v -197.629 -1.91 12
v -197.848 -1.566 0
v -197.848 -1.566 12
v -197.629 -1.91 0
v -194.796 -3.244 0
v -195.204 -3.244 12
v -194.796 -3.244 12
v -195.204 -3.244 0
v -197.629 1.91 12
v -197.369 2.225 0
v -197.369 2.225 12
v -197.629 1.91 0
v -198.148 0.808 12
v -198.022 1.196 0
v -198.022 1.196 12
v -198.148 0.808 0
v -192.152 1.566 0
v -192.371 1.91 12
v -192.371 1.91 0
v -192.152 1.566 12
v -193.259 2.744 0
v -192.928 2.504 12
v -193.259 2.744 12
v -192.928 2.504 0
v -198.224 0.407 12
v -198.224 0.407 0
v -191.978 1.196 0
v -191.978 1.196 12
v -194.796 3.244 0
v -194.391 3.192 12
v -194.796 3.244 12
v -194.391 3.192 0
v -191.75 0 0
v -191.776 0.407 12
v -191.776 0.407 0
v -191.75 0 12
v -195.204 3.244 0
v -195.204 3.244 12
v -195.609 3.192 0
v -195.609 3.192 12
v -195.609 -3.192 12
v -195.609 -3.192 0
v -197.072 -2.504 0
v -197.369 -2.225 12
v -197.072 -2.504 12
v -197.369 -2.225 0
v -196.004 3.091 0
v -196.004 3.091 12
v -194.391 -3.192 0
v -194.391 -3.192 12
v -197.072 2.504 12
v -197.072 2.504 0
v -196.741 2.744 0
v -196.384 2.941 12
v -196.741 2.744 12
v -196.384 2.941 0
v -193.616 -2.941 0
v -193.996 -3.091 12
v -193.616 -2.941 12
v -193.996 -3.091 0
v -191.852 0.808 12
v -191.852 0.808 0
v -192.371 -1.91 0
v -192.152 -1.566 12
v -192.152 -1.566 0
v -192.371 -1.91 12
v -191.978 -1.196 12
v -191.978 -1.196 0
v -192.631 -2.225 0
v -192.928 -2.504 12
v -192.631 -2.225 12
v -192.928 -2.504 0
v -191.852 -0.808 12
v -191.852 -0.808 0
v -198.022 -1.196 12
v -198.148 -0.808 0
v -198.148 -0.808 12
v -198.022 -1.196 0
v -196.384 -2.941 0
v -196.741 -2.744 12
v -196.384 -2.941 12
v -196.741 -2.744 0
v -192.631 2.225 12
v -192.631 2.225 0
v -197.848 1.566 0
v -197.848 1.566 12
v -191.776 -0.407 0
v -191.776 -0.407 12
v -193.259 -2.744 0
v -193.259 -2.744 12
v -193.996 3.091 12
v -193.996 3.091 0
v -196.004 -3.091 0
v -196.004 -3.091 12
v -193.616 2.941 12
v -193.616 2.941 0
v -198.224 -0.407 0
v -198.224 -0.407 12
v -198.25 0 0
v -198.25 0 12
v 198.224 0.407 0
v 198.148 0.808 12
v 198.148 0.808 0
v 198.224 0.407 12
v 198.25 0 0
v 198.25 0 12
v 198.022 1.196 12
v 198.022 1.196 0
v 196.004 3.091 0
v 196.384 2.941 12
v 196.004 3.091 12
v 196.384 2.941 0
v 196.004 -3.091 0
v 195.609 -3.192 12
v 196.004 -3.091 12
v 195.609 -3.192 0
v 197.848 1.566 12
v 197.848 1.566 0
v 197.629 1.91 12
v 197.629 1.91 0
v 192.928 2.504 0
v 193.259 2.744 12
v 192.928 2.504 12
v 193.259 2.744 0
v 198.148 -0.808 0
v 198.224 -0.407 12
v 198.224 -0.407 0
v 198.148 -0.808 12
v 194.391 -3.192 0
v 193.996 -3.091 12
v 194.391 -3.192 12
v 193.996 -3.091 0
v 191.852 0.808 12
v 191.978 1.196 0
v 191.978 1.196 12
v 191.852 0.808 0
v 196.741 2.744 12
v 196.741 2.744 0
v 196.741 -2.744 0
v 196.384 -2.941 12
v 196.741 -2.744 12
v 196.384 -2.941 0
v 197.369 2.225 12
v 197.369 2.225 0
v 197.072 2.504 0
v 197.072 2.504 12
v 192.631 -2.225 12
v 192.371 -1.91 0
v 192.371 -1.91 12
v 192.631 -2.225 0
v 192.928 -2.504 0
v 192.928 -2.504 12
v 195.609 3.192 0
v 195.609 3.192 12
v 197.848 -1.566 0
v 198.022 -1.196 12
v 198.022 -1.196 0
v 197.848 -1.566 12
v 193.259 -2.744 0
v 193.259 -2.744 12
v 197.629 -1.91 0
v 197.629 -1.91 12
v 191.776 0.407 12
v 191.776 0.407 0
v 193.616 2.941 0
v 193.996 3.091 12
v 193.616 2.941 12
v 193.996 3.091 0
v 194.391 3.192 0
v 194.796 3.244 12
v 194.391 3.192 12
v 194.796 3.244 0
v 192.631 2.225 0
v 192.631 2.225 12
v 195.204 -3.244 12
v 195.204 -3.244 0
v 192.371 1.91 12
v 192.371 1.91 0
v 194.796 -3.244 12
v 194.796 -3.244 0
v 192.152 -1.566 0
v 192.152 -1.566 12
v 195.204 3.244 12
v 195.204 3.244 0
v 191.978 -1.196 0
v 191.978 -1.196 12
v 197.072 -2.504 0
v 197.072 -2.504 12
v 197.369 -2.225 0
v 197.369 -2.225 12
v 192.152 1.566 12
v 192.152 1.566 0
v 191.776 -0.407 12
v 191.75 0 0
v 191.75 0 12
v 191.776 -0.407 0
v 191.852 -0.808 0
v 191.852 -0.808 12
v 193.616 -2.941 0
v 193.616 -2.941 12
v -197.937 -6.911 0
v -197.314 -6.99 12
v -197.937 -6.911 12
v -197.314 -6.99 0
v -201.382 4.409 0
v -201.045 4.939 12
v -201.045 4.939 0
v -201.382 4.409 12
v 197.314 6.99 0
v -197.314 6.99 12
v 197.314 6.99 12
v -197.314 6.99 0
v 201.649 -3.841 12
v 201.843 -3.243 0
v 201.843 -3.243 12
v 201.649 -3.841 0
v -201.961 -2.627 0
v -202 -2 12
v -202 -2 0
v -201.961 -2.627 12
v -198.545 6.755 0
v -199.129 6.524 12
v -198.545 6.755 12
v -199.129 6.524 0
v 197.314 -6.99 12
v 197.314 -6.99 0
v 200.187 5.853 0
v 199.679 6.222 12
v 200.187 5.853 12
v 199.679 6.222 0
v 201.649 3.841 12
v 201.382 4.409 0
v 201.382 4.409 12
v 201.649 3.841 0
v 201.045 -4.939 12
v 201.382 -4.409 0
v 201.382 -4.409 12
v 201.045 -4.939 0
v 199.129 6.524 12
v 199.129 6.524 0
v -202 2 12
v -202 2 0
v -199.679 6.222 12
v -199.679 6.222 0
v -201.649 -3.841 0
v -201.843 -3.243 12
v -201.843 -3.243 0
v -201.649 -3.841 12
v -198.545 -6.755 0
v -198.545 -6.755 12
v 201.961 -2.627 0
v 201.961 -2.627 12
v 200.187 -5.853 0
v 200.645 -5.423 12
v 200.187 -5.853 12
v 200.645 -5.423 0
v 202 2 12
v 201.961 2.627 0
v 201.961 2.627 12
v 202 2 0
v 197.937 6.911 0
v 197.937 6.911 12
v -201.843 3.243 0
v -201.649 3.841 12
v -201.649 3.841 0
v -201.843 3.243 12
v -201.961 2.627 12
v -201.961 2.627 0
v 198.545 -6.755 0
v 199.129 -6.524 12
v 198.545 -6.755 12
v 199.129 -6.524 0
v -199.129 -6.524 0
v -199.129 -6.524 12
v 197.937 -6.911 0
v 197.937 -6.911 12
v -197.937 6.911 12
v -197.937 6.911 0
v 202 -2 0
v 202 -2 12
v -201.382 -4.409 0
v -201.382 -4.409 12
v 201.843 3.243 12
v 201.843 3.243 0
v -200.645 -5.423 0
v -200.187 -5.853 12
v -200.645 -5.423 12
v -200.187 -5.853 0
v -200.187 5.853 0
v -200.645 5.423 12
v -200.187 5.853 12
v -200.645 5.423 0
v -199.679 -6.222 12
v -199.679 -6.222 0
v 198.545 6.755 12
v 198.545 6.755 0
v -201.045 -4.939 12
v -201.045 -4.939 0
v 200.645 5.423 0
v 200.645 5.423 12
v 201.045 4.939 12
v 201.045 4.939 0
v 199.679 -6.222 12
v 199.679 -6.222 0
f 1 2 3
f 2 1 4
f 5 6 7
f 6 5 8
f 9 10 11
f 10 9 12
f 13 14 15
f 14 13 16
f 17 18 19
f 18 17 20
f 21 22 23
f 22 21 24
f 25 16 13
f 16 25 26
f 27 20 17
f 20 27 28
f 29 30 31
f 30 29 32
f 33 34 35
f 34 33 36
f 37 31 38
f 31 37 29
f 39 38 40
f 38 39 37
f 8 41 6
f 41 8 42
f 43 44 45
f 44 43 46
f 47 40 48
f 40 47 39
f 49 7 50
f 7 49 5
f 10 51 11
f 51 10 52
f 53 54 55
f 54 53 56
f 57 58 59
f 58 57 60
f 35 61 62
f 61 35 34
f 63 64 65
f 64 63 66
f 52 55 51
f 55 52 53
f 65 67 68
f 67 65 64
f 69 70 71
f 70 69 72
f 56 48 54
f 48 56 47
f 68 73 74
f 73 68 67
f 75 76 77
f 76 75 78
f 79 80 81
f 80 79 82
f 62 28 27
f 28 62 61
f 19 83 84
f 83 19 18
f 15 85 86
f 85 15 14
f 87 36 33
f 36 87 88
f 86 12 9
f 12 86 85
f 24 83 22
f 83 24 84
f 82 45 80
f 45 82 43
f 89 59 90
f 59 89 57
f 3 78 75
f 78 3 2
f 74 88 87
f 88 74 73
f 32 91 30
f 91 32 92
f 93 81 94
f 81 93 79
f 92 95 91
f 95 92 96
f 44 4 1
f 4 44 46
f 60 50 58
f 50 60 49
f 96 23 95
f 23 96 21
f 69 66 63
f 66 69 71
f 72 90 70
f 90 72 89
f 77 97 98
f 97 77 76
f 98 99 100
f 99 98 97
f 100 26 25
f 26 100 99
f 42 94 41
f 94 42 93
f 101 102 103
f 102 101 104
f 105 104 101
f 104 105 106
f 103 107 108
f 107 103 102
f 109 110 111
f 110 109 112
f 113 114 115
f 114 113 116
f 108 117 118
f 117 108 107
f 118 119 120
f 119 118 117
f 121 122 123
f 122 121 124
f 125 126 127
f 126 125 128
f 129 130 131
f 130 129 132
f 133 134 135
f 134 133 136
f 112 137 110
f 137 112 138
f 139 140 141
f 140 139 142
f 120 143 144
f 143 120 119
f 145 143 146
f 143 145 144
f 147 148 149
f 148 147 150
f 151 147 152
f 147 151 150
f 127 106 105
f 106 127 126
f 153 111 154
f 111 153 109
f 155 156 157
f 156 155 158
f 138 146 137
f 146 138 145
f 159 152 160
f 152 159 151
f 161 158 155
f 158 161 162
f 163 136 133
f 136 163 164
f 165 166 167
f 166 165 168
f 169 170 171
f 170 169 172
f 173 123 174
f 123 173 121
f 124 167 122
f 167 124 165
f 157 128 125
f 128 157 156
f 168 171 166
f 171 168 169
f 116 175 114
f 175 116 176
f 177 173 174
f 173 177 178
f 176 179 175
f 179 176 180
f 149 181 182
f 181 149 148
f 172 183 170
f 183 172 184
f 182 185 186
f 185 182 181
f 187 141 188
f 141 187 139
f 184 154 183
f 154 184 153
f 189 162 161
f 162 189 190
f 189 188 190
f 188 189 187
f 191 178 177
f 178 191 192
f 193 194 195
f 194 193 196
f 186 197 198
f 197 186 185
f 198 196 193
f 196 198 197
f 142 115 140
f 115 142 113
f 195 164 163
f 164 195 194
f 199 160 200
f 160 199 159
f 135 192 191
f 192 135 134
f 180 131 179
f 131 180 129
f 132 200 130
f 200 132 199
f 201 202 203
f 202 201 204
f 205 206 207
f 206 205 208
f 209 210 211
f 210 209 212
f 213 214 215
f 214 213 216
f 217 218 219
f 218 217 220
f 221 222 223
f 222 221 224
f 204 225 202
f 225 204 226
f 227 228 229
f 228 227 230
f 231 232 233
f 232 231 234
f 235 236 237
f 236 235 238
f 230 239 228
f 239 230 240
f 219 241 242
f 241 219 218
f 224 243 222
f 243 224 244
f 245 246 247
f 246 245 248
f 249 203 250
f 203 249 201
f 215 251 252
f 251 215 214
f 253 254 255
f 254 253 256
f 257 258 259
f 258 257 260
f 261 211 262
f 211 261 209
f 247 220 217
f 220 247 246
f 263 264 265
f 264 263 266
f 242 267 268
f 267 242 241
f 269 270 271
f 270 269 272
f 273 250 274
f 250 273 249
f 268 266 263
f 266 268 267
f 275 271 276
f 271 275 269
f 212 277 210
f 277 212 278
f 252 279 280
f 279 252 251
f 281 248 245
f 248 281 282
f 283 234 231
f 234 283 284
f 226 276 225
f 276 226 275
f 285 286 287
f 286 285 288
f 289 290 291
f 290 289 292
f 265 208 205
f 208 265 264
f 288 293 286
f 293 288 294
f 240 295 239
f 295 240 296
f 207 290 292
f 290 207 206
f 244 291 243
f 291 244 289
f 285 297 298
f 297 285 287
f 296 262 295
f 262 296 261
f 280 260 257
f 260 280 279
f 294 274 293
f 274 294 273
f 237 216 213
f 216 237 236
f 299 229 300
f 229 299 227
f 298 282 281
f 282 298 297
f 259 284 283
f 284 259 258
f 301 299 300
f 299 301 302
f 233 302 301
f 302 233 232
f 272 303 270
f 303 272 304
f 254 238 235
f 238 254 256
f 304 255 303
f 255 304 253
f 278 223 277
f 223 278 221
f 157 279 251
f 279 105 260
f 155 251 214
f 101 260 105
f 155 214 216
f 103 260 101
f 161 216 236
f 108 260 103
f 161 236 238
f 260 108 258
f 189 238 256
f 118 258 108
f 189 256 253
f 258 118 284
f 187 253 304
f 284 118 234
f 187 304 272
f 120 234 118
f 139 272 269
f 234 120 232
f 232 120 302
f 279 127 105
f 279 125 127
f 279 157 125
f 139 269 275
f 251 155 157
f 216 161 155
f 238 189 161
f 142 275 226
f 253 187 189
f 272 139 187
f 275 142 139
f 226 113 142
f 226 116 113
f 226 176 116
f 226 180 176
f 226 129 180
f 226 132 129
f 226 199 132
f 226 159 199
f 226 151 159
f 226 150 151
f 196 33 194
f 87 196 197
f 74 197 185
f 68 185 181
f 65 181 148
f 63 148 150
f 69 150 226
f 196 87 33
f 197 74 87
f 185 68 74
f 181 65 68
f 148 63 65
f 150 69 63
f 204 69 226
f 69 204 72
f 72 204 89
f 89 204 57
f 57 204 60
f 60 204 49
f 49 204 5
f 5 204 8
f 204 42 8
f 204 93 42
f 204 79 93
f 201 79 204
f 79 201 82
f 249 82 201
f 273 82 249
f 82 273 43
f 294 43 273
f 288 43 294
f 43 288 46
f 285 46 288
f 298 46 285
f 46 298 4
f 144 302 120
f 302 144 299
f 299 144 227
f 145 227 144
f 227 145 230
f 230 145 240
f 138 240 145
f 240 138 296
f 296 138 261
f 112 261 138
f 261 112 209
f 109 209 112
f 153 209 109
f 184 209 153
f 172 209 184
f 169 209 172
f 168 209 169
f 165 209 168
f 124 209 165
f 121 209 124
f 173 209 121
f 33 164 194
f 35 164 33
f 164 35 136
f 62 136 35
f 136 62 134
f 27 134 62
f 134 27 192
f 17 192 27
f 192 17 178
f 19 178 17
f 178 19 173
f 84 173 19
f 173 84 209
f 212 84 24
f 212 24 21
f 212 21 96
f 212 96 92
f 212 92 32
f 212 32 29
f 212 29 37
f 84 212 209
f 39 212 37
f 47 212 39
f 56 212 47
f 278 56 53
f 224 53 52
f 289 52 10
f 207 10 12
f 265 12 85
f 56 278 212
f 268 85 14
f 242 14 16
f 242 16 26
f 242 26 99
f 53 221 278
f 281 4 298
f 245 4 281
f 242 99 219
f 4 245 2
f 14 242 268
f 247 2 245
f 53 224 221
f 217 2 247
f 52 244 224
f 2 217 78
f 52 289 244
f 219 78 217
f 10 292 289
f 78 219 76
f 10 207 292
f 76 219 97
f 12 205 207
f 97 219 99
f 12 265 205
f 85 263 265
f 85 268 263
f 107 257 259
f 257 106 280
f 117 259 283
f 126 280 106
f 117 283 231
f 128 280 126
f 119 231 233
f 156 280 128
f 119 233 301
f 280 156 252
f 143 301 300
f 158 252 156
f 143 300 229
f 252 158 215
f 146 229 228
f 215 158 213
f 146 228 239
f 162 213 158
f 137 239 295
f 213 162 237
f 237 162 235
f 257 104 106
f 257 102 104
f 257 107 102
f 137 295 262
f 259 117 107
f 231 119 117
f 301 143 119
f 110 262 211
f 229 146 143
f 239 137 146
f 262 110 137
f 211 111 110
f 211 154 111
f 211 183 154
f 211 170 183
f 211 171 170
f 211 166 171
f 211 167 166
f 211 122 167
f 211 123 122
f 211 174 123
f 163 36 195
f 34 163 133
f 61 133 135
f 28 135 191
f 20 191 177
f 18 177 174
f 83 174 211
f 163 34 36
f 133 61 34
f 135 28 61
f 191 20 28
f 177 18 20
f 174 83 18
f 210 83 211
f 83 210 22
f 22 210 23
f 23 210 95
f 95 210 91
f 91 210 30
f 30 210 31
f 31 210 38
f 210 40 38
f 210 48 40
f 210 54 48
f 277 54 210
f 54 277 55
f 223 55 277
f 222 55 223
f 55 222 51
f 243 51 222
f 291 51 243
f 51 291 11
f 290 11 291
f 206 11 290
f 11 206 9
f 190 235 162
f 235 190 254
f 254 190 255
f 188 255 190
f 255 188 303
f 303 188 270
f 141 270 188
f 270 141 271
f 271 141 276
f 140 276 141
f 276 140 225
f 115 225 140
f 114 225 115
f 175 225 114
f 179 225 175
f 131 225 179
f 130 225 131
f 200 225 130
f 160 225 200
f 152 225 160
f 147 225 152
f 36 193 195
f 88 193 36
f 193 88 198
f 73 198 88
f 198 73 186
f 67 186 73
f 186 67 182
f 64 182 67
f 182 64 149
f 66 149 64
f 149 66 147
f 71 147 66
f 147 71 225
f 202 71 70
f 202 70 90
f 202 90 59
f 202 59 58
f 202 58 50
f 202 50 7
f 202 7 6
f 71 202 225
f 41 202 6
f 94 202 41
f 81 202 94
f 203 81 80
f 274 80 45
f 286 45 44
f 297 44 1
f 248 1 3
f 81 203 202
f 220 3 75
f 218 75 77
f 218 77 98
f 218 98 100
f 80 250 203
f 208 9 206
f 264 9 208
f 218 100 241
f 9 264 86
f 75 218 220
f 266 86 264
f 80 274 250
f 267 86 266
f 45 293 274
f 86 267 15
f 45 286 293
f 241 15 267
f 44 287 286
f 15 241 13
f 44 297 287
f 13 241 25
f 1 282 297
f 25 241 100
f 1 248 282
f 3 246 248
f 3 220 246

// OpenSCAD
$fn = 50;


difference() {
	union() {
		hull() {
			translate(v = [-197.0000000000, 2.0000000000, 0]) {
				cylinder(h = 12, r = 5);
			}
			translate(v = [197.0000000000, 2.0000000000, 0]) {
				cylinder(h = 12, r = 5);
			}
			translate(v = [-197.0000000000, -2.0000000000, 0]) {
				cylinder(h = 12, r = 5);
			}
			translate(v = [197.0000000000, -2.0000000000, 0]) {
				cylinder(h = 12, r = 5);
			}
		}
	}
	union() {
		translate(v = [-195.0000000000, 0.0000000000, -100.0000000000]) {
			cylinder(h = 200, r = 3.2500000000);
		}
		translate(v = [-195.0000000000, 0.0000000000, -100.0000000000]) {
			cylinder(h = 200, r = 3.2500000000);
		}
		translate(v = [195.0000000000, 0.0000000000, -100.0000000000]) {
			cylinder(h = 200, r = 3.2500000000);
		}
		translate(v = [195.0000000000, 0.0000000000, -100.0000000000]) {
			cylinder(h = 200, r = 3.2500000000);
		}
	}
}
